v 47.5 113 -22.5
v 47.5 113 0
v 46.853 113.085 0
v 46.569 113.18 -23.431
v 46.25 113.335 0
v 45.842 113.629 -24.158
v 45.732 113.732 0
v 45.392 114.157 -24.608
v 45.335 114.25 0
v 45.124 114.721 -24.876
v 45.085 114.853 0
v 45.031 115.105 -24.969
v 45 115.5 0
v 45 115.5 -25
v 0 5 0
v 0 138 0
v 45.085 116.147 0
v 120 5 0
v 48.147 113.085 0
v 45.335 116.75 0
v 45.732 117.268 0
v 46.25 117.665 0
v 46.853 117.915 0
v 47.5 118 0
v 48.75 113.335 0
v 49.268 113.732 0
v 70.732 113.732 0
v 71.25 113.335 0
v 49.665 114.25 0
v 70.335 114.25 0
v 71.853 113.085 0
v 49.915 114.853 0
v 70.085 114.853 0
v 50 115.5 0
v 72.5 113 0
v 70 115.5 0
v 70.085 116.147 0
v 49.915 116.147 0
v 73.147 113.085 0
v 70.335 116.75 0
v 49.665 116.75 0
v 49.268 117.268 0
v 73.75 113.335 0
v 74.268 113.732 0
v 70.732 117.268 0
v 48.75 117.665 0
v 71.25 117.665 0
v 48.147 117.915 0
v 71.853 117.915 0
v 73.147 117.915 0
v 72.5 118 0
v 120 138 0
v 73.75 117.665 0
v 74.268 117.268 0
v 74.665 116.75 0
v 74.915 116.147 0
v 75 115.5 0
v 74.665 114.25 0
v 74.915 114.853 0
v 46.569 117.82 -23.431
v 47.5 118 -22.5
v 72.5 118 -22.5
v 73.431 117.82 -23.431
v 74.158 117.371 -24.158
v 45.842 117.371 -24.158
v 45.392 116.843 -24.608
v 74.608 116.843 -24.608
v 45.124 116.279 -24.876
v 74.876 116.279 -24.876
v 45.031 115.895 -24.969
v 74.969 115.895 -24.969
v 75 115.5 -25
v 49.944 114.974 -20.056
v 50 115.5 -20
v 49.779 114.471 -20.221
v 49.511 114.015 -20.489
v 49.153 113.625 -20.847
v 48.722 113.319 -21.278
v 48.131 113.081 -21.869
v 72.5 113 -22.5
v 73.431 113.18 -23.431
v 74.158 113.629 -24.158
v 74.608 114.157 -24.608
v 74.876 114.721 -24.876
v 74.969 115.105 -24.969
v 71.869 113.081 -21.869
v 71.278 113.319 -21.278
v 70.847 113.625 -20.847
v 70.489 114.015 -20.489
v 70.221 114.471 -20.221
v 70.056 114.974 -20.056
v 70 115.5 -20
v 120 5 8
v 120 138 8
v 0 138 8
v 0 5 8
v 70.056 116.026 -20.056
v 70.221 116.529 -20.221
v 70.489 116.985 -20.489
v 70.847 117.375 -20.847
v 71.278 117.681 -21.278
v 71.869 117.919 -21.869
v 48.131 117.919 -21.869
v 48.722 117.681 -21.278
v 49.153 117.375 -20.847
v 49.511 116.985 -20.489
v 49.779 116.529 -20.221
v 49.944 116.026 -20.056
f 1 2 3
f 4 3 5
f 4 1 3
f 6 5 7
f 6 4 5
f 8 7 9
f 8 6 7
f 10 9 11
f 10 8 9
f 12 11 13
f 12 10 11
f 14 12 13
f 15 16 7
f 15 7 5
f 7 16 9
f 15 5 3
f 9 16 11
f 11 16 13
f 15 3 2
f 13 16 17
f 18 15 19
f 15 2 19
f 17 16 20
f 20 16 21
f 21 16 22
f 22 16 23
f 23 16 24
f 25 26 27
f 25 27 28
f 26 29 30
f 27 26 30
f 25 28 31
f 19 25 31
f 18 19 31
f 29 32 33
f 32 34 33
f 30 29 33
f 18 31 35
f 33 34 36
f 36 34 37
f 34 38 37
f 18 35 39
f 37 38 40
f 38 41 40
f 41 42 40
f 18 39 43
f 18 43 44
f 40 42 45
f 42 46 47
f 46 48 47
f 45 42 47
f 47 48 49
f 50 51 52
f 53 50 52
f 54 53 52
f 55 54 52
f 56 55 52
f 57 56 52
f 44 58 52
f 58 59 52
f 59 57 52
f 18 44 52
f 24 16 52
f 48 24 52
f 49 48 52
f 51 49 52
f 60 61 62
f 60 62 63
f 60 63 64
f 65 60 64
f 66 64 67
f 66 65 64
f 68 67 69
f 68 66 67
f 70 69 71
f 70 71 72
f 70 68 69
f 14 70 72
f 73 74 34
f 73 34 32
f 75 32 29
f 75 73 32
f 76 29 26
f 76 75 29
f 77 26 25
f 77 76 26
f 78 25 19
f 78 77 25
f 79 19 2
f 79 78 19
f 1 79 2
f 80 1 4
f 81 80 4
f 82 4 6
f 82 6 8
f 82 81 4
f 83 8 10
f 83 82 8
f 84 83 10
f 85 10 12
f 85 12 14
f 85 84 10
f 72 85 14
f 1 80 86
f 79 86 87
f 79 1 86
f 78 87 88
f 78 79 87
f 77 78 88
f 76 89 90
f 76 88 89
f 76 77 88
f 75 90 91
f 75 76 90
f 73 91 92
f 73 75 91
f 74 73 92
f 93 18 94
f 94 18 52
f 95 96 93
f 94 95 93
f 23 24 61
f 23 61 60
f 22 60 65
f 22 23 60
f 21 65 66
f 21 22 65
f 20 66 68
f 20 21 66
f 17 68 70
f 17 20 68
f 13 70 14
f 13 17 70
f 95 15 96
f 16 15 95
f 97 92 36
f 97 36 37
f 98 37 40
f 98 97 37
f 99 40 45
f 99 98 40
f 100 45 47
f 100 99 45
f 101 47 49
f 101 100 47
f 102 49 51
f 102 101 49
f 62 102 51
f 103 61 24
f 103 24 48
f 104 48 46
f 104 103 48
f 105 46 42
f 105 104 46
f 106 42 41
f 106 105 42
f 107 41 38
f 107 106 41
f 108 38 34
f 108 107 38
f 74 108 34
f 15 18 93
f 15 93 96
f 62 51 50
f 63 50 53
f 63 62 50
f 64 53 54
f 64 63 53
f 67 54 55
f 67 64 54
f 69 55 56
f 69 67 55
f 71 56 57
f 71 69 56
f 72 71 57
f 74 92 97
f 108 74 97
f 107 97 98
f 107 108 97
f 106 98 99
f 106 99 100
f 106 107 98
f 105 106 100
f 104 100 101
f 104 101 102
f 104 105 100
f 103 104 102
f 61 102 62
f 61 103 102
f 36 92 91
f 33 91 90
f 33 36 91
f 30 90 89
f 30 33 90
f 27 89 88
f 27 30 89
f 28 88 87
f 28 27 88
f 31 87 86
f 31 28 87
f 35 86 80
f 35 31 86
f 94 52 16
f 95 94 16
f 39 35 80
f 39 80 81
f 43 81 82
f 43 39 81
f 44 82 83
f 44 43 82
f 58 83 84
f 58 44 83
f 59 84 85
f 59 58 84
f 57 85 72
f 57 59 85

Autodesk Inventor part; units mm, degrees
ref_plane "YZ Plane" through (0, 0, 0) normal (1, 0, 0) x (0, 1, 0)
ref_plane "XZ Plane" through (0, 0, 0) normal (0, 1, 0) x (-1, 0, 0)
ref_plane "XY Plane" through (0, 0, 0) normal (0, 0, 1) x (1, 0, 0)
sketch "Skizze1" plane through (0, 0, 0) normal (0, 0, 1) x (1, 0, 0)
  line L0 (-24, 0) -> (144, 0) projected
  line L1 (0, -27.6) -> (0, 165.6) projected
  line L2 (0, 0) -> (120, 0)
  line L3 (120, 0) -> (120, 138)
  line L4 (120, 138) -> (0, 138)
  line L5 (0, 138) -> (0, 0)
  point P0 (0, 138)
  dimension "d0" = 120
  dimension "d1" = 138
extrude "Extrusion1" add sketch "Skizze1" along normal blind 8
sketch "Skizze2" plane through (0, 0, 0) normal (0, 0, -1) x (-1, 0, 0)
  line L0 (-75, 118) -> (-70, 118)
  line L1 (-70, 118) -> (-70, 113)
  line L2 (-70, 113) -> (-75, 113)
  line L3 (-75, 113) -> (-75, 118)
  line L4 (-50, 118) -> (-45, 118)
  line L5 (-45, 118) -> (-45, 113)
  line L6 (-45, 113) -> (-50, 113)
  line L7 (-50, 113) -> (-50, 118)
  line L8 (0, 138) -> (0, 0) projected
  line L9 (-120, 0) -> (-120, 138) projected
  line L10 (-120, 138) -> (0, 138) projected
  dimension "d4" = 5
  dimension "d5" = 5
  dimension "d6" = 5
  dimension "d7" = 5
  dimension "d8" = 45
  dimension "d9" = 45
  dimension "d10" = 20
  dimension "d11" = 20
extrude "Extrusion2" add sketch "Skizze2" along normal blind 20
sketch "Skizze3" plane through (0, 0, -20) normal (0, 0, -1) x (-1, 0, 0)
  line L0 (-70, 118) -> (-75, 118) projected
  line L1 (-70, 113) -> (-70, 118) projected
  line L2 (-75, 118) -> (-70, 118)
  line L3 (-70, 118) -> (-70, 113)
  line L4 (-70, 113) -> (-75, 113)
  line L5 (-75, 113) -> (-75, 118)
  point P0 (0, 0)
extrude "Extrusion3" add sketch "Skizze3" along normal blind 5
sketch "Skizze4" plane through (70, 113, 0) normal (-1, 0, 0) x (0, 0, 1)
  line L0 (0, 5) -> (-25, 5) projected
  line L1 (-20, 5) -> (-20, 0) projected
  line L2 (-25, 5) -> (-20, 5)
  line L3 (-20, 5) -> (-20, 0)
  line L4 (-20, 0) -> (-25, 0)
  line L5 (-25, 0) -> (-25, 5)
  point P0 (0, -113)
extrude "Extrusion4" add sketch "Skizze4" along normal blind 25
fillet "Rundung1" radius 2.5 12 edges at (70, 113, -10) (75, 113, -12.5) (60, 113, -20) (60, 113, -25) (50, 113, -10) (45, 113, -12.5) (60, 118, -25) (70, 118, -10) (75, 118, -12.5) (60, 118, -20) (45, 118, -12.5) (50, 118, -10)
sketch "Skizze7" plane through (0, 0, 0) normal (0, 0, -1) x (-1, 0, 0)
  point P0 (0, 0)
sketch "Skizze8" plane through (0, 0, 0) normal (0, 0, -1) x (-1, 0, 0)
  line L0 (-120, 0) -> (-120, 138) projected
  line L1 (0, 138) -> (0, 0) projected
  line L2 (-120, 5) -> (0, 5)
  line L3 (0, 5) -> (0, 0)
  line L4 (0, 0) -> (-120, 0)
  line L5 (-120, 0) -> (-120, 5)
  point P0 (0, 5)
  dimension "d25" = 5
extrude "Extrusion7" cut sketch "Skizze8" against normal blind 10
properties part number "DeckelMess" material "Acetalharz, Schwarz"
